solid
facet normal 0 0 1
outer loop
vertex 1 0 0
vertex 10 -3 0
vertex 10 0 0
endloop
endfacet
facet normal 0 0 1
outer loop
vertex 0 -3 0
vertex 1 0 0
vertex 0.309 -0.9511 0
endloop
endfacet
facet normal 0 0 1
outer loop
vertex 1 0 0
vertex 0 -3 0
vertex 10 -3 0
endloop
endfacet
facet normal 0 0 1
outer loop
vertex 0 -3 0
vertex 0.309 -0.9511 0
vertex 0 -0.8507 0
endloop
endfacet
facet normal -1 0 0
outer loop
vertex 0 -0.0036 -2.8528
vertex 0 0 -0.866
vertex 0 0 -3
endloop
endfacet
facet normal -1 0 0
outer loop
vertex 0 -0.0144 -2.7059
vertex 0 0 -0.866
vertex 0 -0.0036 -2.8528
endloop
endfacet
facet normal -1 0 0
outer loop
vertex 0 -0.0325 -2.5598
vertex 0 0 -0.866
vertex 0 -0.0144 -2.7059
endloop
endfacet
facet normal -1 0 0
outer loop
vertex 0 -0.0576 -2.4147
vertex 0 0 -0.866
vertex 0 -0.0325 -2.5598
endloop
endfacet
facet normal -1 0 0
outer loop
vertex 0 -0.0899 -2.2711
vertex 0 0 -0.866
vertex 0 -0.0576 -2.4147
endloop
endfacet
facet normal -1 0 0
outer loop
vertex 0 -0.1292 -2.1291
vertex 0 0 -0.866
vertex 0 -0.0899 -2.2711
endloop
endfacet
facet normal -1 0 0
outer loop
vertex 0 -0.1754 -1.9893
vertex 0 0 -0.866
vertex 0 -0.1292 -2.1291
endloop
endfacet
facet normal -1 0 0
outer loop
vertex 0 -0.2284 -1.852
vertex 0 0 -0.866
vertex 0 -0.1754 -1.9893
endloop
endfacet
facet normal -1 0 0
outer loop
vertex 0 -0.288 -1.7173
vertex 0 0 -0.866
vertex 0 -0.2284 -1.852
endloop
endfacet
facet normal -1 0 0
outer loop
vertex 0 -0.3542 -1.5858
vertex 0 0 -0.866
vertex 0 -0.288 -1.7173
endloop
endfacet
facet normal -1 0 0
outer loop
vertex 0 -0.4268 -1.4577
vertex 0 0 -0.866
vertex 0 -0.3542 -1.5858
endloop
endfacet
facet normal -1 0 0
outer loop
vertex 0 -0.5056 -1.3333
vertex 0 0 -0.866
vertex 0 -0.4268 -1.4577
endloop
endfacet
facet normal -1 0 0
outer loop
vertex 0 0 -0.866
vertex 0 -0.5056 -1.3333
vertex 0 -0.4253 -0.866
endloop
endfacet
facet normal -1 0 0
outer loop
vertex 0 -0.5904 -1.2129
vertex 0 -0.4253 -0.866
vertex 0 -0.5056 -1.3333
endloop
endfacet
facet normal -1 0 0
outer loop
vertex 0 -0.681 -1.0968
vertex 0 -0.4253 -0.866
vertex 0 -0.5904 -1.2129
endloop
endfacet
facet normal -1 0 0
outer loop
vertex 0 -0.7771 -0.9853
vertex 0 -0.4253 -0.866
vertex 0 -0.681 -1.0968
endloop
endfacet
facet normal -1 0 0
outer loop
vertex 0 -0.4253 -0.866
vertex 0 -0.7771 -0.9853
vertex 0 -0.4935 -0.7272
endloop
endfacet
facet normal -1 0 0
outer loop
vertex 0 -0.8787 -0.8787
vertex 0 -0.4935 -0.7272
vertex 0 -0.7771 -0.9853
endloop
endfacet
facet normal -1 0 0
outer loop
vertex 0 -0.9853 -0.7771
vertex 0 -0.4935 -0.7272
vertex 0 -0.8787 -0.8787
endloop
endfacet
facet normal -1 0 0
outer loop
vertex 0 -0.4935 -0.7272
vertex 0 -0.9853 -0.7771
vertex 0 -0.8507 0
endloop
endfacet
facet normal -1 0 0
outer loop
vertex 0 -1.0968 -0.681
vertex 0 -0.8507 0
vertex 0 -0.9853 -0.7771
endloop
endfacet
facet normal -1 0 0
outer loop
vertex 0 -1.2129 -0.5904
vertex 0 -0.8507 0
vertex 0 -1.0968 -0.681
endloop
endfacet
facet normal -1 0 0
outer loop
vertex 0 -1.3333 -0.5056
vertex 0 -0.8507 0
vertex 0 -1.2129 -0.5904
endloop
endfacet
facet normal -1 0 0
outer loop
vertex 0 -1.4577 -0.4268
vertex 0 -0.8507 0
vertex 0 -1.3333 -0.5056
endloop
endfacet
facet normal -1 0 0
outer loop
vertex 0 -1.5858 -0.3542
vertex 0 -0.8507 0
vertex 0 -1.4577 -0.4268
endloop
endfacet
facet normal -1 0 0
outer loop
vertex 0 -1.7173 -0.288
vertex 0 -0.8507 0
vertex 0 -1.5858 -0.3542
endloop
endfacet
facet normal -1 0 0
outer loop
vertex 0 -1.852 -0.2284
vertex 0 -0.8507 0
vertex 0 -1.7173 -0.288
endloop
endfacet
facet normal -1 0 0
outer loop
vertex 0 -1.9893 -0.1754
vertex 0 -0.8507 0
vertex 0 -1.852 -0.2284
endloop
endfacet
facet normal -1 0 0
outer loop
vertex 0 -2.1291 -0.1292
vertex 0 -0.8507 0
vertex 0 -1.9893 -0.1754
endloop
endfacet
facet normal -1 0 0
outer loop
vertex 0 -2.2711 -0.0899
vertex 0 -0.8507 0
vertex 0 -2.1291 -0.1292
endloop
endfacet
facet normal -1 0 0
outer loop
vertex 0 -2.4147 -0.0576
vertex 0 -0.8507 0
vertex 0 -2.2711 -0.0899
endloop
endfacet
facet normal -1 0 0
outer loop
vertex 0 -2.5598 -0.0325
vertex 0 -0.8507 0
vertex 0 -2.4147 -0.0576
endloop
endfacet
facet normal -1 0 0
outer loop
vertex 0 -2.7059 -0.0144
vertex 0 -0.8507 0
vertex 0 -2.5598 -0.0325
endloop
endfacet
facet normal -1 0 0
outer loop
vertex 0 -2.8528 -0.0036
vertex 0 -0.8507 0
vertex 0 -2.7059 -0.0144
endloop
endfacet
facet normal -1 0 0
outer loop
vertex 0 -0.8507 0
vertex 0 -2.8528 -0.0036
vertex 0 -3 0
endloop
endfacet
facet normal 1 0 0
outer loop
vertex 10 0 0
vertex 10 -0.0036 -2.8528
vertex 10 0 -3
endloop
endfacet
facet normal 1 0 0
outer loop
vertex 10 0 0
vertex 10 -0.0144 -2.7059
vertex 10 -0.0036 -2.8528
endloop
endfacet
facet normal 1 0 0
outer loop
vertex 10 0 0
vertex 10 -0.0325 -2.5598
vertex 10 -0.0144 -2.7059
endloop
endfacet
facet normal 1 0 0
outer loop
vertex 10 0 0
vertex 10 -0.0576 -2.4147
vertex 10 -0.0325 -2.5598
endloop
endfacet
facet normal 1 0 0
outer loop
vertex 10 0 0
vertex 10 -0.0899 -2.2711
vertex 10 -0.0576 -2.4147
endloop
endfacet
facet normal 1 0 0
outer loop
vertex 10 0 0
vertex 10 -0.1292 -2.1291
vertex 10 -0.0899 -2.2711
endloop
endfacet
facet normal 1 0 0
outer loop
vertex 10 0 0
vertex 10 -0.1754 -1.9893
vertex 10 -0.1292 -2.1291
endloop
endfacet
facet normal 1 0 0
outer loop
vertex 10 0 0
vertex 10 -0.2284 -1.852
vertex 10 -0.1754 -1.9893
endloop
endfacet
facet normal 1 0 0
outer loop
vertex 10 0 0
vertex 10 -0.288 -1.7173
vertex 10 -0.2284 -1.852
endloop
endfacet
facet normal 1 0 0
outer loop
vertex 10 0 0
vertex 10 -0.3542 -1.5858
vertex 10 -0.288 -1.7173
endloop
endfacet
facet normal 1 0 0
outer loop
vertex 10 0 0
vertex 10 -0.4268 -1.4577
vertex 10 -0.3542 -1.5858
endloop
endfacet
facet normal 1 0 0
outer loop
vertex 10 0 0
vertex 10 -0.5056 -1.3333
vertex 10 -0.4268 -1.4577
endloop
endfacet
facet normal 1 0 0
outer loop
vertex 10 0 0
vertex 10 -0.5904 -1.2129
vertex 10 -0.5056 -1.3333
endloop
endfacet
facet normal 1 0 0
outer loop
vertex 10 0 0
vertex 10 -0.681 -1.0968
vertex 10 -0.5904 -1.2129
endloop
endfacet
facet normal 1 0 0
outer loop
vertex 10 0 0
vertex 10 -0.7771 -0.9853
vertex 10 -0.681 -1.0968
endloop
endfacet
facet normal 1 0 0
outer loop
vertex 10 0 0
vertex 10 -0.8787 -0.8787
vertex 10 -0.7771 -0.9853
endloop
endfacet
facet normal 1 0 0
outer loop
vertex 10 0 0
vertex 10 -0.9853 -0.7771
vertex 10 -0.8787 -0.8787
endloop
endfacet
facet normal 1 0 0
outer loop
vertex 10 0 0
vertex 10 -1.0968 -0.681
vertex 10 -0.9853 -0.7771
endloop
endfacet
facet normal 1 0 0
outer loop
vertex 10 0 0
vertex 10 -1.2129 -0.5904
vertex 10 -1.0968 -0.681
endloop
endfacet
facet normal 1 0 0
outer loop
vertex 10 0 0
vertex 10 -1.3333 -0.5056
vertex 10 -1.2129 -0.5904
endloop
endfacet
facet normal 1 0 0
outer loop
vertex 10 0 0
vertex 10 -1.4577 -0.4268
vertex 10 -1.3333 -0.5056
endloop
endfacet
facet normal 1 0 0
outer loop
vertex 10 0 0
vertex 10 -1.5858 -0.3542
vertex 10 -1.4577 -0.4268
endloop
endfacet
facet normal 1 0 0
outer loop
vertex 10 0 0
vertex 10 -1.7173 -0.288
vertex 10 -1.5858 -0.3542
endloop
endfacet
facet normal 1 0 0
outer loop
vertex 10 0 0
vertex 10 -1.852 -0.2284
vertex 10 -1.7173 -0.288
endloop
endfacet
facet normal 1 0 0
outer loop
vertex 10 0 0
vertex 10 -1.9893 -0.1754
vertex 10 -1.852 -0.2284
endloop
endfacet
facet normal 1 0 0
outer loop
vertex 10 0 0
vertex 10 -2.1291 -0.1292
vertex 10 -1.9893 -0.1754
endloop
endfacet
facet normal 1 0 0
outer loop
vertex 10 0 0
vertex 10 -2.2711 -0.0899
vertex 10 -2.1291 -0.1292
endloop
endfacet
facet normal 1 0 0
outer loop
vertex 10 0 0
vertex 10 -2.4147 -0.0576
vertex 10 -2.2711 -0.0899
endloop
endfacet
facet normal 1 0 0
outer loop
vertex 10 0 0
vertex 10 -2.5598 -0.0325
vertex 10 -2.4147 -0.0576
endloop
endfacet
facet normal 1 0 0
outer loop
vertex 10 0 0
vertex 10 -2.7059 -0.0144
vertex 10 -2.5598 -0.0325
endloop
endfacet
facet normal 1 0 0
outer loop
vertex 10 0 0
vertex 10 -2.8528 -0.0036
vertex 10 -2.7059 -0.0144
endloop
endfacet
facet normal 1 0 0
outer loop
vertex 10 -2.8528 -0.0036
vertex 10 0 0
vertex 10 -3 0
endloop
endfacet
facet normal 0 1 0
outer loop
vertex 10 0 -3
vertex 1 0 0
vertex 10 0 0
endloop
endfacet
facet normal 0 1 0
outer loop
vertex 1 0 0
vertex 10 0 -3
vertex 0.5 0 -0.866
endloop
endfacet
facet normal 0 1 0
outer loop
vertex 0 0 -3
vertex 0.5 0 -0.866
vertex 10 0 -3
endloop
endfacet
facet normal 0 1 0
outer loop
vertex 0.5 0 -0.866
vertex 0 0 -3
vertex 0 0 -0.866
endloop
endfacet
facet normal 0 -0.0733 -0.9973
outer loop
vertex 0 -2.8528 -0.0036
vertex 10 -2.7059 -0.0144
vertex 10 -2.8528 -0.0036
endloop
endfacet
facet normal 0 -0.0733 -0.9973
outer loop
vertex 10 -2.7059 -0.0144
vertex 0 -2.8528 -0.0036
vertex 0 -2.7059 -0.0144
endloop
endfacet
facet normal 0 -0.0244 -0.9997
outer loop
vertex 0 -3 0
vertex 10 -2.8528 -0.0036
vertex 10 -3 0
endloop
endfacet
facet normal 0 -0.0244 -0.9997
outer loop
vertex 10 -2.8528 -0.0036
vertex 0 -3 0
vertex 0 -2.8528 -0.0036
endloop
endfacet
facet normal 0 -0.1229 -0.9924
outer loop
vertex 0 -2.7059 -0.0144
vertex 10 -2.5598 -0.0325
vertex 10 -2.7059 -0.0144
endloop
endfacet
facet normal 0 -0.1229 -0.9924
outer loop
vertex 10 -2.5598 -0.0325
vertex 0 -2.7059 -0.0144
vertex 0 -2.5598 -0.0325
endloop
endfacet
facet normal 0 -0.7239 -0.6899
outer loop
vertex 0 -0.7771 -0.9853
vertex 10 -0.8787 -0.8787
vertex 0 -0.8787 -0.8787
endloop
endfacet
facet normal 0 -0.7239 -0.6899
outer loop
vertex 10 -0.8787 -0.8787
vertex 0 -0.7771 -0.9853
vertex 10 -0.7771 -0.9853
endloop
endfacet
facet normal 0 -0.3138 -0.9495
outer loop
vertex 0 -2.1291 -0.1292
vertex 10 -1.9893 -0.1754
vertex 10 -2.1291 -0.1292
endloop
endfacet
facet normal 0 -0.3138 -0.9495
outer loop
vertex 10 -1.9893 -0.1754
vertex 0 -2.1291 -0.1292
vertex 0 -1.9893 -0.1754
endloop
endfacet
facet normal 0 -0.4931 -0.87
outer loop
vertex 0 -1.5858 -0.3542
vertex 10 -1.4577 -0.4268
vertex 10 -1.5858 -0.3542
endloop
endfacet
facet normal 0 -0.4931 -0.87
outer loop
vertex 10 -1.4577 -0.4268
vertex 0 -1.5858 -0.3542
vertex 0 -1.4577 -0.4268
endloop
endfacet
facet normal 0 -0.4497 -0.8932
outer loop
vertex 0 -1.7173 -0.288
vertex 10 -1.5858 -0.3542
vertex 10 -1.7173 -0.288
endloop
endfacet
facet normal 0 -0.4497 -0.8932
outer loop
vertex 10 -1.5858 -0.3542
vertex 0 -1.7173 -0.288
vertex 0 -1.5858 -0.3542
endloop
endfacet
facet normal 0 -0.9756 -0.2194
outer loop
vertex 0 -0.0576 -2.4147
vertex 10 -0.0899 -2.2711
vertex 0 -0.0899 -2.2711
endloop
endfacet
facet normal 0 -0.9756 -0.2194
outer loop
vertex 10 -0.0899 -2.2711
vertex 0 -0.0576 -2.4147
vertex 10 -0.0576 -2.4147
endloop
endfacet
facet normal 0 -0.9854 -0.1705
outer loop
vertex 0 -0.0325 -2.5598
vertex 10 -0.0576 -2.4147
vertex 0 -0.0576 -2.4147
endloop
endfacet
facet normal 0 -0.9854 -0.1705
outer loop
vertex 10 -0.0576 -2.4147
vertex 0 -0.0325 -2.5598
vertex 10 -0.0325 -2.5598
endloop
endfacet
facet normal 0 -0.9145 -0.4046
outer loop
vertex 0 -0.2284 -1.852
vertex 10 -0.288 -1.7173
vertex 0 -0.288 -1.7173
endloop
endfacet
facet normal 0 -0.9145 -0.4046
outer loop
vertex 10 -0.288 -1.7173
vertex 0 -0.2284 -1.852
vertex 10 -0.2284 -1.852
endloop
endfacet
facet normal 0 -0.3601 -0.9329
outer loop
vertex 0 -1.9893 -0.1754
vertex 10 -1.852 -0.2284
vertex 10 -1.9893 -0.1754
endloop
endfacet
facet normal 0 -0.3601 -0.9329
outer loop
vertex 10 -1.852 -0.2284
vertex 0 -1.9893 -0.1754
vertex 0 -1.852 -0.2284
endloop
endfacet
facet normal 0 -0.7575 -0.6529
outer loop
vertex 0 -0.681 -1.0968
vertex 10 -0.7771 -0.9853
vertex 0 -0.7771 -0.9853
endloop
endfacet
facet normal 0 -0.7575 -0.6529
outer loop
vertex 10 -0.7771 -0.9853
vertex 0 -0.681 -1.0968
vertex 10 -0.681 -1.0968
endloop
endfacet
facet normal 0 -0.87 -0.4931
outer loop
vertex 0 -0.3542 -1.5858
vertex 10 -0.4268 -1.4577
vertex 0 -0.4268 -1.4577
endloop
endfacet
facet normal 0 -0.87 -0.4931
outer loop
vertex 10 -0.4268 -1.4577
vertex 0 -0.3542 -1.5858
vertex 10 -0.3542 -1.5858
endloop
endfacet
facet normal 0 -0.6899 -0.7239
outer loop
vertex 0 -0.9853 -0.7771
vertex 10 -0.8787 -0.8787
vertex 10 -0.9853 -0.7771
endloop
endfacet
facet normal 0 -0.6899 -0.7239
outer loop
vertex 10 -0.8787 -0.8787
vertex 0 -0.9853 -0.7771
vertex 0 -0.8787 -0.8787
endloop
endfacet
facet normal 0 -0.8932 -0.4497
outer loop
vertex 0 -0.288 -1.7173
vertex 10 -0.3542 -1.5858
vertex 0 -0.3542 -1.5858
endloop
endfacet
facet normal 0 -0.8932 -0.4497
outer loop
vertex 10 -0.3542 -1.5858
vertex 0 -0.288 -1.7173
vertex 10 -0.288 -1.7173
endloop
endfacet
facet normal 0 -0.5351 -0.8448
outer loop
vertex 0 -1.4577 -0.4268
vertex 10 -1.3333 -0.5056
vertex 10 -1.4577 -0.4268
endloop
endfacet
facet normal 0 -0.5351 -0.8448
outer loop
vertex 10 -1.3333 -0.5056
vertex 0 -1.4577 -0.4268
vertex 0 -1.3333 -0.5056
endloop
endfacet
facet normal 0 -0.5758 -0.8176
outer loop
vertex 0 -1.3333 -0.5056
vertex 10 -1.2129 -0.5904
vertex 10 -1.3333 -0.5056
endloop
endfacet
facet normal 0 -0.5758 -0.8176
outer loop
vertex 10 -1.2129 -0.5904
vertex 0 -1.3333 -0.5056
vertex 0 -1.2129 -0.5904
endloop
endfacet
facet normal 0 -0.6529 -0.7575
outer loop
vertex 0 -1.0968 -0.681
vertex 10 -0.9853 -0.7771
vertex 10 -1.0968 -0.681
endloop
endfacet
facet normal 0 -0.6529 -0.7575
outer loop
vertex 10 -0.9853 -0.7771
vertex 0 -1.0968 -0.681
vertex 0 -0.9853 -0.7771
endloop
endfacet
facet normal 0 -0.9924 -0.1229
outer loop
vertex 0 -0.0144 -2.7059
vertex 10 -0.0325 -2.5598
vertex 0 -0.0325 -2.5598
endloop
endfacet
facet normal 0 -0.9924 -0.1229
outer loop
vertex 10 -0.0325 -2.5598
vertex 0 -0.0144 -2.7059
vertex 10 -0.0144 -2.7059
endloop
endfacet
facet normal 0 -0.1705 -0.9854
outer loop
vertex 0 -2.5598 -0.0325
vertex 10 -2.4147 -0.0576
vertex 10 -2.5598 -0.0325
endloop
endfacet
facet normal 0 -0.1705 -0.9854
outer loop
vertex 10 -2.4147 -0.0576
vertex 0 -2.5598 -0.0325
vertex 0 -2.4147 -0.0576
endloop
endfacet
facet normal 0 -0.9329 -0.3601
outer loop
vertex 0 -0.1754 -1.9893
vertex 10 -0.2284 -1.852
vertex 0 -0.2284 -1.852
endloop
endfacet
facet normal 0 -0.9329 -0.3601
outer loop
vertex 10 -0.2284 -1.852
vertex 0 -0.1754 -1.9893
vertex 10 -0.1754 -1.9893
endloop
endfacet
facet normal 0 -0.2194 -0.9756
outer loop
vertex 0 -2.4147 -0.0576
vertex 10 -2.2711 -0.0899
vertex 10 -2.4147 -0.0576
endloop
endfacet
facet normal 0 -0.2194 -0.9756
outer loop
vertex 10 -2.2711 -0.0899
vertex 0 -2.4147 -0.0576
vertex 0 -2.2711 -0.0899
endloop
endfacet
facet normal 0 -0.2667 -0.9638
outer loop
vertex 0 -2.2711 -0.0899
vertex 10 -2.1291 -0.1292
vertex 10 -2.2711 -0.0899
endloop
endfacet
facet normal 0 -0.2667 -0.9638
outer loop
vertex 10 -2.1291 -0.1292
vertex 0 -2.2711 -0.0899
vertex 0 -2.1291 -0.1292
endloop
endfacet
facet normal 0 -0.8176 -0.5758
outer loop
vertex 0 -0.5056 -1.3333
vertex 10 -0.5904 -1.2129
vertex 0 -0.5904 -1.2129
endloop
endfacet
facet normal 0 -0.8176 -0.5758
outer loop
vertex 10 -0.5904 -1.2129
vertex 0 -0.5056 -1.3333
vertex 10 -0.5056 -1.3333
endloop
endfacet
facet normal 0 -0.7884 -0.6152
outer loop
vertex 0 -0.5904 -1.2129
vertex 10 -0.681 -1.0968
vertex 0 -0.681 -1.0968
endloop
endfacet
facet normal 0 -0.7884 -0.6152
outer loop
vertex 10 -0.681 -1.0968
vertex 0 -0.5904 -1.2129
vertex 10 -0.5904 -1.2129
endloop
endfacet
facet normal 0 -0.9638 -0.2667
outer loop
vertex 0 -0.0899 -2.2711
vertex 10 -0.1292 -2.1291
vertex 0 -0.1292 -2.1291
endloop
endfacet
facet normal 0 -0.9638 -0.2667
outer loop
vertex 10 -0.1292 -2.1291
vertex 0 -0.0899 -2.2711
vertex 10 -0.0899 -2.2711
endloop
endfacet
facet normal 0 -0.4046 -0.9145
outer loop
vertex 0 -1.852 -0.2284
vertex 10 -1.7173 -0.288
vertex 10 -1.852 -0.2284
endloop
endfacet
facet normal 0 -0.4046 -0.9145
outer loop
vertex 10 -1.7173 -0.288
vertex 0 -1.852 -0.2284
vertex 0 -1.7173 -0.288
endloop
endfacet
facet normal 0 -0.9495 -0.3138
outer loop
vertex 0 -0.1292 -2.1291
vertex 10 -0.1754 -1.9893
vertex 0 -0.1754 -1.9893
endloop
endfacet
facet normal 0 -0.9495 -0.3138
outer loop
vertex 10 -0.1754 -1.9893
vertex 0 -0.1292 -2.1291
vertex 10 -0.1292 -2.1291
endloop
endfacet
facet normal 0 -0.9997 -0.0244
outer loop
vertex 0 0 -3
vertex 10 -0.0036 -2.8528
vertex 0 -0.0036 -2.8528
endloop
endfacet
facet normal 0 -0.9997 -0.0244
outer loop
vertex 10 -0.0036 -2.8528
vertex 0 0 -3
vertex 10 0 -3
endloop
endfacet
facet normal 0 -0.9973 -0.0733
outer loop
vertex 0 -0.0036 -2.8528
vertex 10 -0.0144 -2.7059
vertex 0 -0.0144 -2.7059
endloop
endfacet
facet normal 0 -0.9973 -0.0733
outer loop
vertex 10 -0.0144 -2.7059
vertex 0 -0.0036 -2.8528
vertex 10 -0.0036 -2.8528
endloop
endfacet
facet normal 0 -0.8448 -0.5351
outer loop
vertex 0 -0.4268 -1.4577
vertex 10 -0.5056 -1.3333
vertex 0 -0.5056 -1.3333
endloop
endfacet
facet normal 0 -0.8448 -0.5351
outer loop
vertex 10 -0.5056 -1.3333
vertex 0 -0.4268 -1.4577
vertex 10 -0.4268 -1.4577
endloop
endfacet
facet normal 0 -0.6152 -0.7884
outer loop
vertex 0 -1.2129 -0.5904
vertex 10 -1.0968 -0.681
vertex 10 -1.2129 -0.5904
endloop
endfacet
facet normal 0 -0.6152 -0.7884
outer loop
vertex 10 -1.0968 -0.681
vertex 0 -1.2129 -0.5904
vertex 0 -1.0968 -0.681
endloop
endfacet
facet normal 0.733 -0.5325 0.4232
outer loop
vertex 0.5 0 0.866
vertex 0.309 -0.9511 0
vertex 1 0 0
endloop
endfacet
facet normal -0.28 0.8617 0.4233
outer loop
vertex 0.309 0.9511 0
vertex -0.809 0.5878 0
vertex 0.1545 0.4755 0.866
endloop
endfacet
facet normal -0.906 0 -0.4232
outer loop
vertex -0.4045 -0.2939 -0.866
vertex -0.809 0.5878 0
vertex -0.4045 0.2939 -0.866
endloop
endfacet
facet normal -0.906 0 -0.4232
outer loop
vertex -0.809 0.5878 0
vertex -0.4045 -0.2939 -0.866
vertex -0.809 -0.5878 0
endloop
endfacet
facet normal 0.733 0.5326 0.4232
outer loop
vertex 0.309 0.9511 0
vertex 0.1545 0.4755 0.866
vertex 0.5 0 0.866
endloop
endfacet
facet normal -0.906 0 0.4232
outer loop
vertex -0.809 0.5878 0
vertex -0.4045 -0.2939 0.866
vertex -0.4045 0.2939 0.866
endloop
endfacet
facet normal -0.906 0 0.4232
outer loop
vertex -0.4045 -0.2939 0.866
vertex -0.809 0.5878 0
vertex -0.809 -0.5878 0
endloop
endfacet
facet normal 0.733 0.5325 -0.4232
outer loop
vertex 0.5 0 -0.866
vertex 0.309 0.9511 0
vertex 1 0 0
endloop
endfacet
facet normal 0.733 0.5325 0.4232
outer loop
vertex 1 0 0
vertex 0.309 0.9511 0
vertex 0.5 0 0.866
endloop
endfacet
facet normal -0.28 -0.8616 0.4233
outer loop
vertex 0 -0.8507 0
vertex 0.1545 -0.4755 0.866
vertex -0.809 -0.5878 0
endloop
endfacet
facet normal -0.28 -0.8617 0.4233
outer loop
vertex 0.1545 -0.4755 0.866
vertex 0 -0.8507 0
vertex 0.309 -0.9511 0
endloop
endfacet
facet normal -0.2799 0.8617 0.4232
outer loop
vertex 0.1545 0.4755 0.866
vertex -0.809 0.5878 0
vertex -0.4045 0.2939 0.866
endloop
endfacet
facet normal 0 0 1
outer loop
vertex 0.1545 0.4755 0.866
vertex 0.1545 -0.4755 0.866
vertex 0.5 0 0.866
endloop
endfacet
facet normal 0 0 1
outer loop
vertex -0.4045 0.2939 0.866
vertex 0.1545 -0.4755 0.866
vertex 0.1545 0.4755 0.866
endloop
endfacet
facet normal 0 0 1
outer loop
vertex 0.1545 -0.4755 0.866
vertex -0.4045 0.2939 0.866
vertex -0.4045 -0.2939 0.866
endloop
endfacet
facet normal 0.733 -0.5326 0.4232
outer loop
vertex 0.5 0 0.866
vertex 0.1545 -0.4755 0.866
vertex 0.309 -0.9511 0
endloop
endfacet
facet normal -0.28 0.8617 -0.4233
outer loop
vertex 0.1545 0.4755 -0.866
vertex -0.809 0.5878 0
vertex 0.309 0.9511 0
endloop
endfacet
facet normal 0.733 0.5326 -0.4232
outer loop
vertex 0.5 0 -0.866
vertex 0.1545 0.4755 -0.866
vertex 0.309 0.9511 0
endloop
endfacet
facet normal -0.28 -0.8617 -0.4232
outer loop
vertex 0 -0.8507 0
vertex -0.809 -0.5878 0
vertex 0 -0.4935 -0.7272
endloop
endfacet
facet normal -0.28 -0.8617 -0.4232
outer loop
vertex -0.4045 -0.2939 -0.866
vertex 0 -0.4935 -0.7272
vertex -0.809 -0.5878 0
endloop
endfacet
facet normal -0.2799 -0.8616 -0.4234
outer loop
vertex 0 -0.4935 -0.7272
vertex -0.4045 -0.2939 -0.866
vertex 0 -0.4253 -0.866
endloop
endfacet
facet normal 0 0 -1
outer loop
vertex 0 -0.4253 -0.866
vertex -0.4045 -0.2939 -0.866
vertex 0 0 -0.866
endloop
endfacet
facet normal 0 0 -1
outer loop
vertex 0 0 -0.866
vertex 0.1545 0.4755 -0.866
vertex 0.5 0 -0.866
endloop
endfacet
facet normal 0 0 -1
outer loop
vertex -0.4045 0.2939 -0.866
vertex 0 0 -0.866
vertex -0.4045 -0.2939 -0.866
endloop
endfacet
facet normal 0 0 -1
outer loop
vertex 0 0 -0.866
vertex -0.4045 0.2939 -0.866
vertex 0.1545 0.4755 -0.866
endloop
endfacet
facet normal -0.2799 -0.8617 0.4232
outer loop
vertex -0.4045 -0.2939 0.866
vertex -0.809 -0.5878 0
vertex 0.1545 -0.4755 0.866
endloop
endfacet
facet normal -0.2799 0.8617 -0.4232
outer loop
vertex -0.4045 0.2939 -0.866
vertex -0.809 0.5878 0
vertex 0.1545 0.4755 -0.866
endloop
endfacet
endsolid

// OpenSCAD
//use <../_round_edge.scad>;
_round_edge(r=3, l=10, test=1, axis="x", rot=0);

module _round_edge(r=10, l=1111, axis="z", x=1, y=1, rot=0, test=0, fn=128){
//    translate([x, y, z]) {
        // Rotation je nach Achse
//    rotate([0,0,0])
    sphere(test);

    rotate(
        axis == "x" ?   [rot, 0, 0] : 
        axis == "y" ?   [0, rot, 0] : 
                        [0, 0, rot]//z
    ){

    translate(
        axis == "x" ?   [l, -r, -r] : 
        axis == "y" ?   [-r, l, -r] : 
                        [-r, -r, 0]//z
    ){
        
    rotate(
        axis == "x" ?   [0, -90, 0] : 
        axis == "y" ?   [90, 0, 0] : 
                        [0, 0, 0]//z
    ){
    difference(){                   
        cube([r,r,l]);
        cylinder(h=l, r=r, $fn=fn);
    }//difference
    }//rotate axis=?
    }
    }//rotate rot=?
}//module
